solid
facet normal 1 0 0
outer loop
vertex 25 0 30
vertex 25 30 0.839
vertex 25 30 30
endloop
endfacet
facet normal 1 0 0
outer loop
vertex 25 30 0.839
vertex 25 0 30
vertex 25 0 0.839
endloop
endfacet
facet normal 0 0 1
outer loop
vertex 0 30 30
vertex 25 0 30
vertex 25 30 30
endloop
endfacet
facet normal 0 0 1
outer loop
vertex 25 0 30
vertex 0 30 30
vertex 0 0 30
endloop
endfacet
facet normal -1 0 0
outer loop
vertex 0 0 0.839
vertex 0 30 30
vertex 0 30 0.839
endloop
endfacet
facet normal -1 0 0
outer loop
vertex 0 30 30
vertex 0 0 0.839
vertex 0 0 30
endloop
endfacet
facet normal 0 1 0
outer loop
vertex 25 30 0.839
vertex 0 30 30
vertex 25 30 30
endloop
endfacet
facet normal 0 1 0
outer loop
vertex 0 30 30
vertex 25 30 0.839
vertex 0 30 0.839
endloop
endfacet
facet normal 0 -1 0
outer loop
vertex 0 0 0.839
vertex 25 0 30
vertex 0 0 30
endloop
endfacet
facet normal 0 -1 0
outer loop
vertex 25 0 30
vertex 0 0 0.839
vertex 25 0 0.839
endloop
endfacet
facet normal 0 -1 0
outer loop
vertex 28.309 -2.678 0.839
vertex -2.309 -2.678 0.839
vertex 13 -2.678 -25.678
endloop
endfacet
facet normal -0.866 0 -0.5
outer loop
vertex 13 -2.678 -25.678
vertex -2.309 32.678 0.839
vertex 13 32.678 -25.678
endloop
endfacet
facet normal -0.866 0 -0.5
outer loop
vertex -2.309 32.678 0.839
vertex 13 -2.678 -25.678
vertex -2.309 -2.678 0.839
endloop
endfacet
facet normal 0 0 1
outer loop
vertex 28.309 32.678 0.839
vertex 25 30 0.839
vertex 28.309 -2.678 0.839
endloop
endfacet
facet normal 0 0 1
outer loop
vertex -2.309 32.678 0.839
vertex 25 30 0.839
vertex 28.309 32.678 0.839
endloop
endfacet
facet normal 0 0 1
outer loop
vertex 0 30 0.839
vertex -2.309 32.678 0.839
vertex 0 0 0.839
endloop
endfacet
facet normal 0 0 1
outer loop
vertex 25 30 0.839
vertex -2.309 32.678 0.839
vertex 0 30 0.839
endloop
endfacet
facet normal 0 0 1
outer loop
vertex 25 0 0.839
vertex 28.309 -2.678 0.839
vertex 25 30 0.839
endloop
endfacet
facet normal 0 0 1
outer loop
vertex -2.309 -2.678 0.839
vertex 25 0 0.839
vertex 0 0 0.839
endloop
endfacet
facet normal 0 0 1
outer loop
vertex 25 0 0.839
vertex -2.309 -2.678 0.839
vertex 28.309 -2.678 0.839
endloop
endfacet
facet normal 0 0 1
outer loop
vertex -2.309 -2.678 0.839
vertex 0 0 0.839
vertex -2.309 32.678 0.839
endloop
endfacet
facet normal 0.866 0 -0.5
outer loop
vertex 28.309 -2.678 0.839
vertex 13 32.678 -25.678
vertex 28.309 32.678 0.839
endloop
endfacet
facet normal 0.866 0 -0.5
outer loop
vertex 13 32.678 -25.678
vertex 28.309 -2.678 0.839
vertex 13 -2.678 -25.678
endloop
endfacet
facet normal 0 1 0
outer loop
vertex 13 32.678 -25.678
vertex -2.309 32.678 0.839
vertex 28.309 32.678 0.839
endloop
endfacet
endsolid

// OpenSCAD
$fn=3;

cube([25, 30, 30]);
rotate([90, 90, 0])
translate([8, 13, -15])
sphere(25, 25, 25);
